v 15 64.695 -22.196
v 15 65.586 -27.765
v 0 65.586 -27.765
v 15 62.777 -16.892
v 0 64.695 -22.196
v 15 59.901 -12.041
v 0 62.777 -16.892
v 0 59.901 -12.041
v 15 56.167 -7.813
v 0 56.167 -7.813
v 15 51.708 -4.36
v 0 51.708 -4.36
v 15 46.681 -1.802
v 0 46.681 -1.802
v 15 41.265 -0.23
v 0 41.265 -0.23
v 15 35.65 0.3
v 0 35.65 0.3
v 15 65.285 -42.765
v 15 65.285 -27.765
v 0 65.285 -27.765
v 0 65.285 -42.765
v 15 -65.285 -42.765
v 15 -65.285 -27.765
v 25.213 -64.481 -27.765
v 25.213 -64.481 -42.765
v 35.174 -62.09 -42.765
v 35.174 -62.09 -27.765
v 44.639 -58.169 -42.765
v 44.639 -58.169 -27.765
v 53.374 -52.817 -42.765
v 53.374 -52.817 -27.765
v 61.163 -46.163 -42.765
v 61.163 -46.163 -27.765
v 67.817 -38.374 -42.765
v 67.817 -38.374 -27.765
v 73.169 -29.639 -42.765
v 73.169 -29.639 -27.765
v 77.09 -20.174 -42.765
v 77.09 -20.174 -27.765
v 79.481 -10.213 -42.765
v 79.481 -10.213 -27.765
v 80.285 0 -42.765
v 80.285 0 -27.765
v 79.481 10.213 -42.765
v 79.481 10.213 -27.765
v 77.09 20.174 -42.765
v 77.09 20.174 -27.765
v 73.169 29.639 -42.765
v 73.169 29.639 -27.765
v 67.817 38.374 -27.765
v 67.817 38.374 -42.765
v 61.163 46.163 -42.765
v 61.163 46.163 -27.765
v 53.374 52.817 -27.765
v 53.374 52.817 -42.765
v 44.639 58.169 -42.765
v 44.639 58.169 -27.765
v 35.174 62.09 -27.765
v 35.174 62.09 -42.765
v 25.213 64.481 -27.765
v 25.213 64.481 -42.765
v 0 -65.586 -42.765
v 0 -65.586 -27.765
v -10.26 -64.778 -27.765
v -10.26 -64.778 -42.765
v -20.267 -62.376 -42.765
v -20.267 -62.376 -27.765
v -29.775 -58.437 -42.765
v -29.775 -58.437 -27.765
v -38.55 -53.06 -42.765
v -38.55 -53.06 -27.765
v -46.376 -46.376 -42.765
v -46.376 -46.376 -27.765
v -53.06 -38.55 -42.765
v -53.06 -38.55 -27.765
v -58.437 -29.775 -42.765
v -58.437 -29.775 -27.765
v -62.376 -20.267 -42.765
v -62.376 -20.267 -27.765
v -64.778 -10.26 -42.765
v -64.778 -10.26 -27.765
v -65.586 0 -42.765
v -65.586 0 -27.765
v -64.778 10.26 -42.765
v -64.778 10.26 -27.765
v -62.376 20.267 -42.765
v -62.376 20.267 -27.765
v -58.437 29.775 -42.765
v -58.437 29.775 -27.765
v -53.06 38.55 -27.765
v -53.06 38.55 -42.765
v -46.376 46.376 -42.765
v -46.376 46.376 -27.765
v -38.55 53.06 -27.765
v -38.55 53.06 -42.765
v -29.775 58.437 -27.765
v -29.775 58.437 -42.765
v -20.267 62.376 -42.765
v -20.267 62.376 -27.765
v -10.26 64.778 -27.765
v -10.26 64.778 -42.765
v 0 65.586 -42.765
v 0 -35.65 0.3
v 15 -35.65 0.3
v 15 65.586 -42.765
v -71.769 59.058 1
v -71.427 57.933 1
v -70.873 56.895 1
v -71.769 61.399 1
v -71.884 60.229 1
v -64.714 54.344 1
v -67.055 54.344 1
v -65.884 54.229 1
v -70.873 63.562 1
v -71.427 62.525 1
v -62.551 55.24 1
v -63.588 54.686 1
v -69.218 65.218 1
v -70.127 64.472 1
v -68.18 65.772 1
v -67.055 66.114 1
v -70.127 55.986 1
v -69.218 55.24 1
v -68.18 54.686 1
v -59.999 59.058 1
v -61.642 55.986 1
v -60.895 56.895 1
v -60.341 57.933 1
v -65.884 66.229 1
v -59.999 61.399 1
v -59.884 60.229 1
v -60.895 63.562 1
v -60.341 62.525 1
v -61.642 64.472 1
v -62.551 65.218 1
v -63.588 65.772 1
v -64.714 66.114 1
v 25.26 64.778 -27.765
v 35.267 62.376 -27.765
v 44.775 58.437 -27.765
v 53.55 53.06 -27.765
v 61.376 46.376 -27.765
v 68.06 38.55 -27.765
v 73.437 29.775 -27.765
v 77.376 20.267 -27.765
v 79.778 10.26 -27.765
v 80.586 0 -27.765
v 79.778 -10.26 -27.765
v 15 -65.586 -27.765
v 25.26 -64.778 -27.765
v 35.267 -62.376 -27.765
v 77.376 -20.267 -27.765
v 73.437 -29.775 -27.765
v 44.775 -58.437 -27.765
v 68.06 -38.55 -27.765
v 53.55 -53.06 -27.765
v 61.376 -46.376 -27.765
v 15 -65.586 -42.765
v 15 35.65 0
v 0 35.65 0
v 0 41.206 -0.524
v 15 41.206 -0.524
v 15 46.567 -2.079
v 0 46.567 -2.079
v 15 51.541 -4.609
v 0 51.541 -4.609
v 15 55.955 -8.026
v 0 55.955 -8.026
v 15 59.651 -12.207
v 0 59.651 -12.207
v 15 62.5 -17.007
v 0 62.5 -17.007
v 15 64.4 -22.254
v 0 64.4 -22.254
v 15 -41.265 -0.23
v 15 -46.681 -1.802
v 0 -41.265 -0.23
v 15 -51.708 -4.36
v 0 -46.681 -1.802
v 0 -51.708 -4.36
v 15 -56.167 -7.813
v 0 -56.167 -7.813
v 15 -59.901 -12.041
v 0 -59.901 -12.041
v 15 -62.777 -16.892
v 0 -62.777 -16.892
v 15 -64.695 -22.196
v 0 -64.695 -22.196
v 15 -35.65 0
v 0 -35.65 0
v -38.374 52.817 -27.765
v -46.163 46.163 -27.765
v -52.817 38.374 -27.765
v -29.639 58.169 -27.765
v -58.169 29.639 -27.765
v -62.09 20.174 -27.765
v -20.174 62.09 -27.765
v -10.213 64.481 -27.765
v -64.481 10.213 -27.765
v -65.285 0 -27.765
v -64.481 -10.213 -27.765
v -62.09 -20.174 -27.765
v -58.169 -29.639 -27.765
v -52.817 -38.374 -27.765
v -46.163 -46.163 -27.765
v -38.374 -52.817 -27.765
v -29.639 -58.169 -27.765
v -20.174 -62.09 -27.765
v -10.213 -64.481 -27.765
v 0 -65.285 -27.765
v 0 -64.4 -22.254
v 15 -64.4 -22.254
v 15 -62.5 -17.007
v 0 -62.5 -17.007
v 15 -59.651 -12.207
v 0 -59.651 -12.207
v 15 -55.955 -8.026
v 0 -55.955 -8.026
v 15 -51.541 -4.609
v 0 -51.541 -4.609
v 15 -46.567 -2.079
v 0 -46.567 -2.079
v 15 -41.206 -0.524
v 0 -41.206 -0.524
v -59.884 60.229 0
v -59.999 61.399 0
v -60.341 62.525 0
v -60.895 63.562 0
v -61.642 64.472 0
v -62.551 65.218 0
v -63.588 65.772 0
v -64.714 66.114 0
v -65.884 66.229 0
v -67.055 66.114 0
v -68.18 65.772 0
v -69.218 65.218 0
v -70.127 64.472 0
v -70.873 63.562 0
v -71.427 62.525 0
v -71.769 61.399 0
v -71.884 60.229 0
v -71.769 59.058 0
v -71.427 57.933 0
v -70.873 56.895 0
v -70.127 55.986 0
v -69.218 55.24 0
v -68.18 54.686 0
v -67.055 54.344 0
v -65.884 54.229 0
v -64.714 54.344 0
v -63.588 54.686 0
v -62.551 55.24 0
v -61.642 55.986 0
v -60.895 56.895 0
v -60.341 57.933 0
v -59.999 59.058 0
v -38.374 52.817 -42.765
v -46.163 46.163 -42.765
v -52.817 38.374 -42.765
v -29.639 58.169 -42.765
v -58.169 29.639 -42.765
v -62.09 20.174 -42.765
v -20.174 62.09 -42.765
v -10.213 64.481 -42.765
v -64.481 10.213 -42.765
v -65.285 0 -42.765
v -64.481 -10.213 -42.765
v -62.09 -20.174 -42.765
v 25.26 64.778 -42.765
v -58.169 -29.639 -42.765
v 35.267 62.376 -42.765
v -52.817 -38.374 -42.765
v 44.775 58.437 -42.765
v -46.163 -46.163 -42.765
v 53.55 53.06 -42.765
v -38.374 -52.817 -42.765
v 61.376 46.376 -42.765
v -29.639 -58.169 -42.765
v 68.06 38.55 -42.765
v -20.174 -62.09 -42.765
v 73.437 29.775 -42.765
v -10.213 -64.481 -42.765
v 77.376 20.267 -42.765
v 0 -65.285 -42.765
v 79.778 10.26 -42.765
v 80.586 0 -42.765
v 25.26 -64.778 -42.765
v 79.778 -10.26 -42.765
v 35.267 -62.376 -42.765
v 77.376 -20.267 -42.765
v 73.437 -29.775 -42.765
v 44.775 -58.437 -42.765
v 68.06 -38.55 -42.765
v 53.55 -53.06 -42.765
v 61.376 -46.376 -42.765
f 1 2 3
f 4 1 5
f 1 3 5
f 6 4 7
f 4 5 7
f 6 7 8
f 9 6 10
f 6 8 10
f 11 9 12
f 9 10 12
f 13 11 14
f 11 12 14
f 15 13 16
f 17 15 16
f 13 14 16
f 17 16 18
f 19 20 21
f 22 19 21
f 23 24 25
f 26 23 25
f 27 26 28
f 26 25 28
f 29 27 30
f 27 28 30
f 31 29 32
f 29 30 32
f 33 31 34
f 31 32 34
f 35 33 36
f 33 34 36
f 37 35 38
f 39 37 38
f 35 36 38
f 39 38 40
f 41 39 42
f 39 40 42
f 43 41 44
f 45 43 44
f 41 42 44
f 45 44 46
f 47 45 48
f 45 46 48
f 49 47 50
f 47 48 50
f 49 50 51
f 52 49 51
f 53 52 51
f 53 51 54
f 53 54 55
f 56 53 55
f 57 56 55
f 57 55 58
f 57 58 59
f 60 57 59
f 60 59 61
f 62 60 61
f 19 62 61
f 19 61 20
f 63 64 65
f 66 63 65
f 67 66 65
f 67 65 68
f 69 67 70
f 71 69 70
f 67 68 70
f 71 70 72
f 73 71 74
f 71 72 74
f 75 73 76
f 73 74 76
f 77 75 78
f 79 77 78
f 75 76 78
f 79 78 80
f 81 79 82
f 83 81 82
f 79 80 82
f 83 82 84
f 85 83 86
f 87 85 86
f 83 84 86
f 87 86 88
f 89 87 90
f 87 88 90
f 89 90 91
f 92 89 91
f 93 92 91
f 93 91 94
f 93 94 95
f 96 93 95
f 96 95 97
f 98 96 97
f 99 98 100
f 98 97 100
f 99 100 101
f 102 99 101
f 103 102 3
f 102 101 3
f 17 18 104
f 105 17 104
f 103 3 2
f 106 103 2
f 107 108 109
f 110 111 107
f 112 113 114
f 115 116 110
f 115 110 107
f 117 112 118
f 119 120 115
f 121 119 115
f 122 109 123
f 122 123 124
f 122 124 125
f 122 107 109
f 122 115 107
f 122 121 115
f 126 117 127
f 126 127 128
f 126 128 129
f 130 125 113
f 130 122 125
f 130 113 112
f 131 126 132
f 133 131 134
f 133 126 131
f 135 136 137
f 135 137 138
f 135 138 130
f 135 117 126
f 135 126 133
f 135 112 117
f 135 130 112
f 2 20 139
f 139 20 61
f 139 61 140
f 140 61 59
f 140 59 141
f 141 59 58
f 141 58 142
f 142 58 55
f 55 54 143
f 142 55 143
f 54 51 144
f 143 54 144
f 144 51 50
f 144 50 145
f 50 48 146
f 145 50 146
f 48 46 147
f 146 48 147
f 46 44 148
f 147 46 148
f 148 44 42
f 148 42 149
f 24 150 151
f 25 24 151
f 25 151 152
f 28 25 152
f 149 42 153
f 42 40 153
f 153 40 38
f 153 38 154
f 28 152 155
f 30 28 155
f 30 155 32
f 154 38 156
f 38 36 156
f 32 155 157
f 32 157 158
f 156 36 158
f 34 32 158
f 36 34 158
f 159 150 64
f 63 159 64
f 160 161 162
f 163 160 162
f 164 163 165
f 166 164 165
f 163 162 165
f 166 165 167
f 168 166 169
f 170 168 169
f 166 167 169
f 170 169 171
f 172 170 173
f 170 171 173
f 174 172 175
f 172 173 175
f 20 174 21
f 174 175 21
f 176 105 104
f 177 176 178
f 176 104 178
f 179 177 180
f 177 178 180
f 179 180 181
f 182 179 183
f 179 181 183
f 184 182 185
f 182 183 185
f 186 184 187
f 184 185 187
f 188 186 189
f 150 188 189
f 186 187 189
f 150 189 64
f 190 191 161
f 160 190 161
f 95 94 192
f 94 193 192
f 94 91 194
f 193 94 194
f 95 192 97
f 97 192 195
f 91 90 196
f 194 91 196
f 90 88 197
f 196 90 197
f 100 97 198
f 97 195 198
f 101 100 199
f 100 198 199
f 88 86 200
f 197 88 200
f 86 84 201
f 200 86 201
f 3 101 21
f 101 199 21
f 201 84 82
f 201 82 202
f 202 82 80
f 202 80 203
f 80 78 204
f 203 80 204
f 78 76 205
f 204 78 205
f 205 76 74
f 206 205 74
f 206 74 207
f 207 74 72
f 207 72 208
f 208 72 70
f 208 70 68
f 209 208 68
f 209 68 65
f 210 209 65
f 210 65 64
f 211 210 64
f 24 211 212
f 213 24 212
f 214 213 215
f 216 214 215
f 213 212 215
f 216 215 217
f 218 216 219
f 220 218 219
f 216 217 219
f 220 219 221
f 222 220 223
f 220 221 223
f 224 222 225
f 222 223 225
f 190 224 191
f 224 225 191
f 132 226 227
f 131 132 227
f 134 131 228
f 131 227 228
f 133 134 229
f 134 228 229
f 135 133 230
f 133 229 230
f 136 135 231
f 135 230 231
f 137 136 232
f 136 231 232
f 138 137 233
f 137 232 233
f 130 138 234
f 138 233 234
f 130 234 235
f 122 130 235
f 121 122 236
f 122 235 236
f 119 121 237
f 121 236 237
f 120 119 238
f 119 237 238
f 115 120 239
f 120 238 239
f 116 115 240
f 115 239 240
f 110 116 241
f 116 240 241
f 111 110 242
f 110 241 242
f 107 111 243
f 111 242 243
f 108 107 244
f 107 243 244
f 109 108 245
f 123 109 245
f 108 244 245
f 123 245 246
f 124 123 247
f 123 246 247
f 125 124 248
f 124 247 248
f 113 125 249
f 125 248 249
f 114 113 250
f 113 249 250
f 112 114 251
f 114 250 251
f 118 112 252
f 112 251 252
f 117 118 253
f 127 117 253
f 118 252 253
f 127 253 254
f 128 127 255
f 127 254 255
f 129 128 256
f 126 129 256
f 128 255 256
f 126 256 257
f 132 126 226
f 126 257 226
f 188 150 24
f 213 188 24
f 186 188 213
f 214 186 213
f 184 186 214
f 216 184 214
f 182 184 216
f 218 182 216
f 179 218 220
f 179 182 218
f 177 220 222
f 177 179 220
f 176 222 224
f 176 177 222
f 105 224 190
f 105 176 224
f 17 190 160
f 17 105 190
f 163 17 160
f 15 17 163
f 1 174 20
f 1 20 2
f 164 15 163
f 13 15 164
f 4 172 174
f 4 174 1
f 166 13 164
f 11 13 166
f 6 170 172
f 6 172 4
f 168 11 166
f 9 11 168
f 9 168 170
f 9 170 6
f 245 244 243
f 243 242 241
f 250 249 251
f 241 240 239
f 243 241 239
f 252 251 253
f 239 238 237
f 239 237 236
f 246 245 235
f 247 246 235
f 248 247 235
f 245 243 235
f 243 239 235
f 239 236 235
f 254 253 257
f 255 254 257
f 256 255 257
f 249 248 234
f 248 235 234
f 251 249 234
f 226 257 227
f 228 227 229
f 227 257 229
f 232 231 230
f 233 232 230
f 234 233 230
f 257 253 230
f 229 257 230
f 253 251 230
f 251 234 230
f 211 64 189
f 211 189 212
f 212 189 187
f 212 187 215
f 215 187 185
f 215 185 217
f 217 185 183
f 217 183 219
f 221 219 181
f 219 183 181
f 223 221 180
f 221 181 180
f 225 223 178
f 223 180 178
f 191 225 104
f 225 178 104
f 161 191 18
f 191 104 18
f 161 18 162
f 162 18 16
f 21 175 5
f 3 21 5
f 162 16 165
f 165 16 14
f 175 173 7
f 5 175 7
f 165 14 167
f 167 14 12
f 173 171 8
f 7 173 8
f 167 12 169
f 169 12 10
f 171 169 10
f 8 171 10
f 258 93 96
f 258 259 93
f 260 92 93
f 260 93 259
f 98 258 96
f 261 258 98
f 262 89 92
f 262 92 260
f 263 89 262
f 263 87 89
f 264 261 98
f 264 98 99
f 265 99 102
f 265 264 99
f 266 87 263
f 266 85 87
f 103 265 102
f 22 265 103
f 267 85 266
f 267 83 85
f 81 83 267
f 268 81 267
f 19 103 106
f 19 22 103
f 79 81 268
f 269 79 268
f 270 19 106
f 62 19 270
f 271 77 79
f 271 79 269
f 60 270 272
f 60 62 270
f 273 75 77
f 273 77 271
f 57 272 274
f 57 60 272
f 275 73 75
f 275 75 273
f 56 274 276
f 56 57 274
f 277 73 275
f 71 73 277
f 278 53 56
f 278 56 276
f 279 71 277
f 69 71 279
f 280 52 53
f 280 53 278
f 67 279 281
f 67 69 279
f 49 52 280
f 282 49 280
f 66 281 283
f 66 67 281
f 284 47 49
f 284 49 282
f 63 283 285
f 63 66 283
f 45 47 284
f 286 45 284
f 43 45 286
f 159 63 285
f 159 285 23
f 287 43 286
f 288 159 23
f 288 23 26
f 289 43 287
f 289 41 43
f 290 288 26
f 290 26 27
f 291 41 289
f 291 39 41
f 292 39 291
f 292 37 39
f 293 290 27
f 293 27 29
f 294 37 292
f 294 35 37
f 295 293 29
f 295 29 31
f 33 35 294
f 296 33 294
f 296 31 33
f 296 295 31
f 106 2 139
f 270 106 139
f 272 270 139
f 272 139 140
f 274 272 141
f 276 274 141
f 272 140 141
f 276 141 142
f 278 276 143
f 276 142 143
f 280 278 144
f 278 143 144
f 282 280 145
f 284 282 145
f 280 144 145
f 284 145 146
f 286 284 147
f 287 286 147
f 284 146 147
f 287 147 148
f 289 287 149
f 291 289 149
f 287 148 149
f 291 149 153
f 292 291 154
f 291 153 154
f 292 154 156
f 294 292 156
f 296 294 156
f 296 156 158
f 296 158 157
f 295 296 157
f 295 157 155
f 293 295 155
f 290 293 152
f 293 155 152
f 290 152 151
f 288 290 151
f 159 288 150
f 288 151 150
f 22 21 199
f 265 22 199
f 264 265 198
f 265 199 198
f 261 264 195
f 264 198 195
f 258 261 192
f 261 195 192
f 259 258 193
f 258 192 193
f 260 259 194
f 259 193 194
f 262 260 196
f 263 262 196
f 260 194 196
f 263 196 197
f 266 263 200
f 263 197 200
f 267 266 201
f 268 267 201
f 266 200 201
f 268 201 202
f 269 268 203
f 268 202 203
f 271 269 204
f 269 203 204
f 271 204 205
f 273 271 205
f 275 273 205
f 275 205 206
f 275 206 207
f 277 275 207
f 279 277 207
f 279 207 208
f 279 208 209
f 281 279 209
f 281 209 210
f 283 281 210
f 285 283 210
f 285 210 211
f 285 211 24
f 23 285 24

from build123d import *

# Parameters (mm, degrees)
F1_DEPTH = 15
F3_DEPTH = 15
F4_R     = 6
F5_DEPTH = 1


with BuildPart() as f1:
    # F0 (on Right) → F1 (new body)
    with BuildSketch(Plane.YZ):
        with BuildLine():
            ThreePointArc((-65.285047, -27.76493), (-55.954725, -8.025672), (-35.65, 0))
            Line((-35.65, 0), (35.65, 0))
            ThreePointArc((35.65, 0), (55.954725, -8.025672), (65.285047, -27.76493))
            Line((65.285047, -27.76493), (65.585679, -27.76493))
            ThreePointArc((65.585679, -27.76493), (56.166976, -7.813435), (35.65, 0.3))
            Line((35.65, 0.3), (-35.65, 0.3))
            ThreePointArc((-35.65, 0.3), (-56.166976, -7.813435), (-65.585679, -27.76493))
            Line((-65.585679, -27.76493), (-65.285047, -27.76493))
        make_face()
    extrude(amount=F1_DEPTH)

    # F2 (on face) → F3 (join)
    with BuildSketch(Plane(origin=(0, 0, -27.76493), x_dir=(1, 0, 0), z_dir=(0, 0, -1))):
        with BuildLine():
            Line((0, -65.585679), (15, -65.585679))
            ThreePointArc((15, -65.585679), (80.585679, 0), (15, 65.585679))
            Line((15, 65.585679), (0, 65.585679))
            ThreePointArc((0, 65.585679), (-65.585679, 0), (0, -65.585679))
        make_face()
        with BuildLine():
            ThreePointArc((15, 65.285047), (80.285047, 0), (15, -65.285047))
            Line((15, -65.285047), (0, -65.285047))
            ThreePointArc((0, -65.285047), (-65.285047, 0), (0, 65.285047))
            Line((0, 65.285047), (15, 65.285047))
        make_face(mode=Mode.SUBTRACT)
    extrude(amount=F3_DEPTH)


with BuildPart() as f5:
    # F4 (on Top) → F5 (new body)
    with BuildSketch(Plane.XY):
        with Locations((-65.884173, 60.228884)):
            Circle(F4_R)
    extrude(amount=F5_DEPTH)


solid = Compound([f1.part, f5.part])
